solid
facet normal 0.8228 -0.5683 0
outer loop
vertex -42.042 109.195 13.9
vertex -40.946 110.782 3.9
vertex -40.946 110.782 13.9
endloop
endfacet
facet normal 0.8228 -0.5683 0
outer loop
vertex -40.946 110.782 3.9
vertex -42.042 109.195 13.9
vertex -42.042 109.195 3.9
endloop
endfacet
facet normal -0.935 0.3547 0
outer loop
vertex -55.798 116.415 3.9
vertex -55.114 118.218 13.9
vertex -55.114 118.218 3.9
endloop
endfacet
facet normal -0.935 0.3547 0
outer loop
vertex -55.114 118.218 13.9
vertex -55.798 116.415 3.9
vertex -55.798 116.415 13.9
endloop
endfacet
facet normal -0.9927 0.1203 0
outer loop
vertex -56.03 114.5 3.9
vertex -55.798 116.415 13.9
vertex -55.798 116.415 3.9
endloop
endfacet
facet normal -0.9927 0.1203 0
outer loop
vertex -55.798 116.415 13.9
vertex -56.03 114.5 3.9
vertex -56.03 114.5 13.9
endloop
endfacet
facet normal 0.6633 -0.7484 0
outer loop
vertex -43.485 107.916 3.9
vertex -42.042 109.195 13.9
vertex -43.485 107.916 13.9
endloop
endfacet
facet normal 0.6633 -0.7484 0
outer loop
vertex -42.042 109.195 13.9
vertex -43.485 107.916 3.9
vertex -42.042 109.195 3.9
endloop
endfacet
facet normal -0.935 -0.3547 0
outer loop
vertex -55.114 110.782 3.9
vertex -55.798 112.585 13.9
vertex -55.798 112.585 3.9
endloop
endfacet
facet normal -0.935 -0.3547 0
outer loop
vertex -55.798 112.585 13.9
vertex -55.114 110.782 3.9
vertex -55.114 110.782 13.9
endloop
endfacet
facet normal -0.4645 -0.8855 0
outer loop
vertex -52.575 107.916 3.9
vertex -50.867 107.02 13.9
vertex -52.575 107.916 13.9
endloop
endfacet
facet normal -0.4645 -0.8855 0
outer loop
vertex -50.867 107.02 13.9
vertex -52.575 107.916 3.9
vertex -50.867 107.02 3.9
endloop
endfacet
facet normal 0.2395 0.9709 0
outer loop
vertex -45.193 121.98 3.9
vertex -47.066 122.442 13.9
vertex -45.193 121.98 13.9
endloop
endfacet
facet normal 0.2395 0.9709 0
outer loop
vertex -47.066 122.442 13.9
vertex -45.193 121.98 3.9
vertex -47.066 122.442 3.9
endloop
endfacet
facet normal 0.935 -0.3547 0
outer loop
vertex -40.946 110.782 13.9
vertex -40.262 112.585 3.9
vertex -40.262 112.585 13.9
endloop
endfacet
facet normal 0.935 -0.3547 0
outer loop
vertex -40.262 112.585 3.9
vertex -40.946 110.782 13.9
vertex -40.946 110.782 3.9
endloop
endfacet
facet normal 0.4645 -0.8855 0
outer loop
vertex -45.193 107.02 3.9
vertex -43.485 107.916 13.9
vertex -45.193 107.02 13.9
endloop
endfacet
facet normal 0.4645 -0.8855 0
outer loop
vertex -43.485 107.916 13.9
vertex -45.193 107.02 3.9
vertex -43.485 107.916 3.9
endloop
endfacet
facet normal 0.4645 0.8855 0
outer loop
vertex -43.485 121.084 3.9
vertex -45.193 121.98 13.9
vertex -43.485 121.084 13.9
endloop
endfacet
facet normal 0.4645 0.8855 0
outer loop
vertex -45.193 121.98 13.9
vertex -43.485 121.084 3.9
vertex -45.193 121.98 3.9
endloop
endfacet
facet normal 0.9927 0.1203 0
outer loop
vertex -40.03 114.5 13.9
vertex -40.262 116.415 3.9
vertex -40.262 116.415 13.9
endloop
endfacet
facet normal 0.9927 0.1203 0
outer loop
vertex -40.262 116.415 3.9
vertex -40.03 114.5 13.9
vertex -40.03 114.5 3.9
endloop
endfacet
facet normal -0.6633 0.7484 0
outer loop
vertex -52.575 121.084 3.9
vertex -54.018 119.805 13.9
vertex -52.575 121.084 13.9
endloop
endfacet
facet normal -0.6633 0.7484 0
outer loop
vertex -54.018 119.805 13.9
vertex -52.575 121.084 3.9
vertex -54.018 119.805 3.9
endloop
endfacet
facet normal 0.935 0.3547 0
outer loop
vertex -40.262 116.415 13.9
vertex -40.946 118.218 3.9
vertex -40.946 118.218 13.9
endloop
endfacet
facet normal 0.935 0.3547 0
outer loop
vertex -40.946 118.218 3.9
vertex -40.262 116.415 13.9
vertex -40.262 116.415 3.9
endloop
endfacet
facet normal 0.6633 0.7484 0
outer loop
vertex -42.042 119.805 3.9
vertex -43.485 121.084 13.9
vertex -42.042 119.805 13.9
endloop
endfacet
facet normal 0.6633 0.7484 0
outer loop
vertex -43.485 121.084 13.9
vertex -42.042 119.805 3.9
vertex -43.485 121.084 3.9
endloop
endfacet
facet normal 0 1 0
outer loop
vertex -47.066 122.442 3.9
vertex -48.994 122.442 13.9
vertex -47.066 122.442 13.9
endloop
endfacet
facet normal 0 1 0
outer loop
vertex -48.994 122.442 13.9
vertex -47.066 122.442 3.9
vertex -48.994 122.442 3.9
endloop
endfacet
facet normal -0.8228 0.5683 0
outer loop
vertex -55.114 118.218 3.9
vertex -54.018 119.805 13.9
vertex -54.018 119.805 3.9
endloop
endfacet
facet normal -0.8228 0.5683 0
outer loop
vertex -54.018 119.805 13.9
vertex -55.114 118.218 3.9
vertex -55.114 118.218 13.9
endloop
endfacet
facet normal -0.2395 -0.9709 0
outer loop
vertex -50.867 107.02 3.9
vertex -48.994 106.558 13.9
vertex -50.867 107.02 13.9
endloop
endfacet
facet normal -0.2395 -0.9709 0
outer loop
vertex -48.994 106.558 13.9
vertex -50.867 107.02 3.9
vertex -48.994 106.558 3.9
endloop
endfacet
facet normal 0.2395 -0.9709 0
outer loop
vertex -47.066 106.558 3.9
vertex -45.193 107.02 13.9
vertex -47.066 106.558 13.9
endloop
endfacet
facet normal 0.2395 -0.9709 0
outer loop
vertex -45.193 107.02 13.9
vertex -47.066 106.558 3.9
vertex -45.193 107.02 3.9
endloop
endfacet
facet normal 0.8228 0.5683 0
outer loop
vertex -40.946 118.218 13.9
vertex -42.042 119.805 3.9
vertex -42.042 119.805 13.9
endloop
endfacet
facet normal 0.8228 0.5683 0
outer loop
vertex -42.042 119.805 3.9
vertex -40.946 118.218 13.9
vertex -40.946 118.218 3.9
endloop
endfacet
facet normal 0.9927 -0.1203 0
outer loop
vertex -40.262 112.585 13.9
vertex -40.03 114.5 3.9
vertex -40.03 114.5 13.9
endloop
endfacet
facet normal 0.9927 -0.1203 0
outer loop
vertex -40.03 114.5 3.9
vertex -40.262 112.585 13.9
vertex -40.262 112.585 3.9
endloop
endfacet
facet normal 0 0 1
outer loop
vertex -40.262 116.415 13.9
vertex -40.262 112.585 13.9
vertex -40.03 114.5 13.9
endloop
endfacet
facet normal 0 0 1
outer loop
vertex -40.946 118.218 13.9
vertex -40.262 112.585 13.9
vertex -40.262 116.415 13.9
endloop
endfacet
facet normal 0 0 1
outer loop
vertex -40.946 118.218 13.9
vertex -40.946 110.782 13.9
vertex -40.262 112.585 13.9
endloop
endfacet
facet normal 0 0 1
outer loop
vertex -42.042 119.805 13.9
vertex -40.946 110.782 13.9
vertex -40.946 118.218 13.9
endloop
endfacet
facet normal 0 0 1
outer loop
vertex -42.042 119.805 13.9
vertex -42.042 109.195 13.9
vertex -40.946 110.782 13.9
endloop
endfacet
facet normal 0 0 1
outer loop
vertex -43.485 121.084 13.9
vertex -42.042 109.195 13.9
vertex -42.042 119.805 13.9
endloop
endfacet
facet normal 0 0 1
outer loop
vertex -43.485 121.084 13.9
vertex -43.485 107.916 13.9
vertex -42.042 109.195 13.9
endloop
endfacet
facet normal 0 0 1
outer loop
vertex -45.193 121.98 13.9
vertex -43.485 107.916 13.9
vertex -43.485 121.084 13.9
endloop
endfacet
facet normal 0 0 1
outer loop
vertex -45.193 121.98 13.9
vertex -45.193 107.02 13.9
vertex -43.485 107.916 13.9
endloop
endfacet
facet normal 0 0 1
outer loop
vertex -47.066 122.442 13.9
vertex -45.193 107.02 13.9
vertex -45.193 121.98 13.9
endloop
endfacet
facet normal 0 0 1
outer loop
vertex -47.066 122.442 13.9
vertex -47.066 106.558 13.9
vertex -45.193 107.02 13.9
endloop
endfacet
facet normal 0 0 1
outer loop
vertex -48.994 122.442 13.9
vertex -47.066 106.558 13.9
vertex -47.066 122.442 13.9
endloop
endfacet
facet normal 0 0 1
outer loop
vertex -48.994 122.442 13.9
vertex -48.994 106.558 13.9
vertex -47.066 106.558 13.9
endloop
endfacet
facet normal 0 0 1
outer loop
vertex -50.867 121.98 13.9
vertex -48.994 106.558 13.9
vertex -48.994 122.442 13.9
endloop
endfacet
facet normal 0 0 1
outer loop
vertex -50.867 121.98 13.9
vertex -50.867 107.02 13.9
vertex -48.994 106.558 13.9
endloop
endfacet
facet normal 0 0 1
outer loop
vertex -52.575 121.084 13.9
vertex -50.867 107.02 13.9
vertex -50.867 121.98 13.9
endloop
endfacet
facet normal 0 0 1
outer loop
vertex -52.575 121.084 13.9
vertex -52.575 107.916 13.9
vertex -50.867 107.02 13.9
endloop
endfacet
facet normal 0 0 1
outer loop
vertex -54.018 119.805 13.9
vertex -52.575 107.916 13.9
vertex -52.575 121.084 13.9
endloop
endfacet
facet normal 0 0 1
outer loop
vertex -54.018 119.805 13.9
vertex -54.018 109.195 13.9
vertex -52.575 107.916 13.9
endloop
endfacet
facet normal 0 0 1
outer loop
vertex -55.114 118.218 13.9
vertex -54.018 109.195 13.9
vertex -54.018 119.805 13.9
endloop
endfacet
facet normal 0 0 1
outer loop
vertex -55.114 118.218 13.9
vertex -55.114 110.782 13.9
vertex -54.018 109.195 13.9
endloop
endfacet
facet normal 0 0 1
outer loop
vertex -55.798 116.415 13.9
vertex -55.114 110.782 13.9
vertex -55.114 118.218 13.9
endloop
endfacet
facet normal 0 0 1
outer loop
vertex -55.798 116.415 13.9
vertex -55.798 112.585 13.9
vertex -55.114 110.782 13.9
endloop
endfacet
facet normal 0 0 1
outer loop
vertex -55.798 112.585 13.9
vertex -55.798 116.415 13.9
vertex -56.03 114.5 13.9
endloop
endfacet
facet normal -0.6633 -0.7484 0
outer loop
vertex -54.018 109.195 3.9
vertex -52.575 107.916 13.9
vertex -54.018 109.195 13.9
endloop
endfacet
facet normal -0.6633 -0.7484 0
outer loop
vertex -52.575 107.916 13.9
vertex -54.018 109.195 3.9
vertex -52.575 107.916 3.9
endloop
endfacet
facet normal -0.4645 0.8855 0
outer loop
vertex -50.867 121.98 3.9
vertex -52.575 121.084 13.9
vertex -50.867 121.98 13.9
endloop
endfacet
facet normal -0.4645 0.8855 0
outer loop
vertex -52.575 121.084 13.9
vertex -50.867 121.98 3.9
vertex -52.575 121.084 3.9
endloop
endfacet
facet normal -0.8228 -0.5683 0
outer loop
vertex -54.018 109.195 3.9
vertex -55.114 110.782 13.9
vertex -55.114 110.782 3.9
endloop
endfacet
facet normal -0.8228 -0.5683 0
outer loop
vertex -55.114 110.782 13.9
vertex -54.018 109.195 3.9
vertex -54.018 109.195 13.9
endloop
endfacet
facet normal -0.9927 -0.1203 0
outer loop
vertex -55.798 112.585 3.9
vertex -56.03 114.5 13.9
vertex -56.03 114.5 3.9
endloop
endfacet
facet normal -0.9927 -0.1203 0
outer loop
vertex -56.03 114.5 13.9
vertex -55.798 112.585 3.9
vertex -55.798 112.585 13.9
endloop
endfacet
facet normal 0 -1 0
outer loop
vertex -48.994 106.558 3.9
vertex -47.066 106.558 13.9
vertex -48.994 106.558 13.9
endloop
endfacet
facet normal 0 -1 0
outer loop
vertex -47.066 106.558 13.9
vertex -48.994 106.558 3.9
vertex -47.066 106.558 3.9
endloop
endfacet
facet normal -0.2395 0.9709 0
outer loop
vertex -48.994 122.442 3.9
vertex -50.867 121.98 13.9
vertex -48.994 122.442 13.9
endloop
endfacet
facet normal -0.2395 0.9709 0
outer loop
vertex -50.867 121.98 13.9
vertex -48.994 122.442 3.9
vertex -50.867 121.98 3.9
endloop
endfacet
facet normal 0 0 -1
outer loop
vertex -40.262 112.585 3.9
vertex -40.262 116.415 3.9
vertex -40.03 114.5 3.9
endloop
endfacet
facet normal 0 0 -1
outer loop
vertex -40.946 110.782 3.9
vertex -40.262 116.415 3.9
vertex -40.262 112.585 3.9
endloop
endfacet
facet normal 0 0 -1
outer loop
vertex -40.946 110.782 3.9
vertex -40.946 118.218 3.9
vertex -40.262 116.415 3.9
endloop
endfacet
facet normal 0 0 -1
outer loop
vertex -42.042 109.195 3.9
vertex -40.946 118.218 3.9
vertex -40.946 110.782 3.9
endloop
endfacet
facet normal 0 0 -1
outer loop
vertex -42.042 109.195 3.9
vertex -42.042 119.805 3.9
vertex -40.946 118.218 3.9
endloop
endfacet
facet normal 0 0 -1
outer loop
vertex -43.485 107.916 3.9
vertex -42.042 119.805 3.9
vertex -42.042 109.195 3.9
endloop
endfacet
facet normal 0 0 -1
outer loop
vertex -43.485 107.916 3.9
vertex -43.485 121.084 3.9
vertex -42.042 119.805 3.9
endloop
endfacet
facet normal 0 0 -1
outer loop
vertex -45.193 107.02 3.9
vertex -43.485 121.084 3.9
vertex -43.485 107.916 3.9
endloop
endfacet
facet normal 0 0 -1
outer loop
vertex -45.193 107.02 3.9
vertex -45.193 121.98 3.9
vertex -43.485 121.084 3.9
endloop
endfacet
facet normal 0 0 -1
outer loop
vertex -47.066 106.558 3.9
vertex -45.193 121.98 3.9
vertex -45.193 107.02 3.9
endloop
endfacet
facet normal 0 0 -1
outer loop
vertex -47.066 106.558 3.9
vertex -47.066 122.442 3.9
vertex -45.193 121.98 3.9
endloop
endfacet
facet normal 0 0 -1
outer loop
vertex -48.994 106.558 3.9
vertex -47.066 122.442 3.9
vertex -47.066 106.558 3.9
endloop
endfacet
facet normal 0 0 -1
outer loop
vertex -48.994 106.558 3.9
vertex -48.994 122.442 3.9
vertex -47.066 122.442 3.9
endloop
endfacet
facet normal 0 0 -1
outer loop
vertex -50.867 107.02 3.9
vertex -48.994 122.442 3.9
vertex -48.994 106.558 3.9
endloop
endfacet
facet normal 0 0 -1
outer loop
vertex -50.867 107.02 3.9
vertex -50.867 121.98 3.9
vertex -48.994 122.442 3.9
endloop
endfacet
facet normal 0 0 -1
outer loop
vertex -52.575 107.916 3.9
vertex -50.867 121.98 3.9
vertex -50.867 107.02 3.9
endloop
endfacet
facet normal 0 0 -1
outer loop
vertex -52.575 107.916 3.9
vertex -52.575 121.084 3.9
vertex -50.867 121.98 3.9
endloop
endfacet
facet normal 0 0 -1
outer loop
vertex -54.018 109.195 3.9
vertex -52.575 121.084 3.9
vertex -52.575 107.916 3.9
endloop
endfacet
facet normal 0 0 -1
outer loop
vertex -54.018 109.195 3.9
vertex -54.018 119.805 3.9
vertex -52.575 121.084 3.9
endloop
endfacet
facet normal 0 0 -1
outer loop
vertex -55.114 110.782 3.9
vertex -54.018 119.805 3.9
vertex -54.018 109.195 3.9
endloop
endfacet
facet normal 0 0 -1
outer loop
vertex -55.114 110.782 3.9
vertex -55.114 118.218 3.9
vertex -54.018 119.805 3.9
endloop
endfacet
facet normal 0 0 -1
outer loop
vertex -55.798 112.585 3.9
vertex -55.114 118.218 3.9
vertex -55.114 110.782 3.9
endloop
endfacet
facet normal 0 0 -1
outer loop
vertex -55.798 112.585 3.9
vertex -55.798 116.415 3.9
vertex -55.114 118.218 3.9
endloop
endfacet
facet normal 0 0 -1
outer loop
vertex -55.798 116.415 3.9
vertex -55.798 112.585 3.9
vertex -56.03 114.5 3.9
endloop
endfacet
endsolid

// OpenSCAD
module dxf_holder(){
linear_extrude(height = 8, center = true, convexity = 5)
   import (file = "spool holdahMK3.dxf", layer = "0");
}
module spool_holder_left(){
    dxf_holder();
    translate([51.53-3.5,123-5-3.5,3.9])cylinder(h = 10, r=8);
    }
module spool_holder_right(){
    mirror([1,0,0])spool_holder_left();
    }
difference() {    
    spool_holder_right();
    translate([6,-5,-4])cube([1,5,10]);
}
